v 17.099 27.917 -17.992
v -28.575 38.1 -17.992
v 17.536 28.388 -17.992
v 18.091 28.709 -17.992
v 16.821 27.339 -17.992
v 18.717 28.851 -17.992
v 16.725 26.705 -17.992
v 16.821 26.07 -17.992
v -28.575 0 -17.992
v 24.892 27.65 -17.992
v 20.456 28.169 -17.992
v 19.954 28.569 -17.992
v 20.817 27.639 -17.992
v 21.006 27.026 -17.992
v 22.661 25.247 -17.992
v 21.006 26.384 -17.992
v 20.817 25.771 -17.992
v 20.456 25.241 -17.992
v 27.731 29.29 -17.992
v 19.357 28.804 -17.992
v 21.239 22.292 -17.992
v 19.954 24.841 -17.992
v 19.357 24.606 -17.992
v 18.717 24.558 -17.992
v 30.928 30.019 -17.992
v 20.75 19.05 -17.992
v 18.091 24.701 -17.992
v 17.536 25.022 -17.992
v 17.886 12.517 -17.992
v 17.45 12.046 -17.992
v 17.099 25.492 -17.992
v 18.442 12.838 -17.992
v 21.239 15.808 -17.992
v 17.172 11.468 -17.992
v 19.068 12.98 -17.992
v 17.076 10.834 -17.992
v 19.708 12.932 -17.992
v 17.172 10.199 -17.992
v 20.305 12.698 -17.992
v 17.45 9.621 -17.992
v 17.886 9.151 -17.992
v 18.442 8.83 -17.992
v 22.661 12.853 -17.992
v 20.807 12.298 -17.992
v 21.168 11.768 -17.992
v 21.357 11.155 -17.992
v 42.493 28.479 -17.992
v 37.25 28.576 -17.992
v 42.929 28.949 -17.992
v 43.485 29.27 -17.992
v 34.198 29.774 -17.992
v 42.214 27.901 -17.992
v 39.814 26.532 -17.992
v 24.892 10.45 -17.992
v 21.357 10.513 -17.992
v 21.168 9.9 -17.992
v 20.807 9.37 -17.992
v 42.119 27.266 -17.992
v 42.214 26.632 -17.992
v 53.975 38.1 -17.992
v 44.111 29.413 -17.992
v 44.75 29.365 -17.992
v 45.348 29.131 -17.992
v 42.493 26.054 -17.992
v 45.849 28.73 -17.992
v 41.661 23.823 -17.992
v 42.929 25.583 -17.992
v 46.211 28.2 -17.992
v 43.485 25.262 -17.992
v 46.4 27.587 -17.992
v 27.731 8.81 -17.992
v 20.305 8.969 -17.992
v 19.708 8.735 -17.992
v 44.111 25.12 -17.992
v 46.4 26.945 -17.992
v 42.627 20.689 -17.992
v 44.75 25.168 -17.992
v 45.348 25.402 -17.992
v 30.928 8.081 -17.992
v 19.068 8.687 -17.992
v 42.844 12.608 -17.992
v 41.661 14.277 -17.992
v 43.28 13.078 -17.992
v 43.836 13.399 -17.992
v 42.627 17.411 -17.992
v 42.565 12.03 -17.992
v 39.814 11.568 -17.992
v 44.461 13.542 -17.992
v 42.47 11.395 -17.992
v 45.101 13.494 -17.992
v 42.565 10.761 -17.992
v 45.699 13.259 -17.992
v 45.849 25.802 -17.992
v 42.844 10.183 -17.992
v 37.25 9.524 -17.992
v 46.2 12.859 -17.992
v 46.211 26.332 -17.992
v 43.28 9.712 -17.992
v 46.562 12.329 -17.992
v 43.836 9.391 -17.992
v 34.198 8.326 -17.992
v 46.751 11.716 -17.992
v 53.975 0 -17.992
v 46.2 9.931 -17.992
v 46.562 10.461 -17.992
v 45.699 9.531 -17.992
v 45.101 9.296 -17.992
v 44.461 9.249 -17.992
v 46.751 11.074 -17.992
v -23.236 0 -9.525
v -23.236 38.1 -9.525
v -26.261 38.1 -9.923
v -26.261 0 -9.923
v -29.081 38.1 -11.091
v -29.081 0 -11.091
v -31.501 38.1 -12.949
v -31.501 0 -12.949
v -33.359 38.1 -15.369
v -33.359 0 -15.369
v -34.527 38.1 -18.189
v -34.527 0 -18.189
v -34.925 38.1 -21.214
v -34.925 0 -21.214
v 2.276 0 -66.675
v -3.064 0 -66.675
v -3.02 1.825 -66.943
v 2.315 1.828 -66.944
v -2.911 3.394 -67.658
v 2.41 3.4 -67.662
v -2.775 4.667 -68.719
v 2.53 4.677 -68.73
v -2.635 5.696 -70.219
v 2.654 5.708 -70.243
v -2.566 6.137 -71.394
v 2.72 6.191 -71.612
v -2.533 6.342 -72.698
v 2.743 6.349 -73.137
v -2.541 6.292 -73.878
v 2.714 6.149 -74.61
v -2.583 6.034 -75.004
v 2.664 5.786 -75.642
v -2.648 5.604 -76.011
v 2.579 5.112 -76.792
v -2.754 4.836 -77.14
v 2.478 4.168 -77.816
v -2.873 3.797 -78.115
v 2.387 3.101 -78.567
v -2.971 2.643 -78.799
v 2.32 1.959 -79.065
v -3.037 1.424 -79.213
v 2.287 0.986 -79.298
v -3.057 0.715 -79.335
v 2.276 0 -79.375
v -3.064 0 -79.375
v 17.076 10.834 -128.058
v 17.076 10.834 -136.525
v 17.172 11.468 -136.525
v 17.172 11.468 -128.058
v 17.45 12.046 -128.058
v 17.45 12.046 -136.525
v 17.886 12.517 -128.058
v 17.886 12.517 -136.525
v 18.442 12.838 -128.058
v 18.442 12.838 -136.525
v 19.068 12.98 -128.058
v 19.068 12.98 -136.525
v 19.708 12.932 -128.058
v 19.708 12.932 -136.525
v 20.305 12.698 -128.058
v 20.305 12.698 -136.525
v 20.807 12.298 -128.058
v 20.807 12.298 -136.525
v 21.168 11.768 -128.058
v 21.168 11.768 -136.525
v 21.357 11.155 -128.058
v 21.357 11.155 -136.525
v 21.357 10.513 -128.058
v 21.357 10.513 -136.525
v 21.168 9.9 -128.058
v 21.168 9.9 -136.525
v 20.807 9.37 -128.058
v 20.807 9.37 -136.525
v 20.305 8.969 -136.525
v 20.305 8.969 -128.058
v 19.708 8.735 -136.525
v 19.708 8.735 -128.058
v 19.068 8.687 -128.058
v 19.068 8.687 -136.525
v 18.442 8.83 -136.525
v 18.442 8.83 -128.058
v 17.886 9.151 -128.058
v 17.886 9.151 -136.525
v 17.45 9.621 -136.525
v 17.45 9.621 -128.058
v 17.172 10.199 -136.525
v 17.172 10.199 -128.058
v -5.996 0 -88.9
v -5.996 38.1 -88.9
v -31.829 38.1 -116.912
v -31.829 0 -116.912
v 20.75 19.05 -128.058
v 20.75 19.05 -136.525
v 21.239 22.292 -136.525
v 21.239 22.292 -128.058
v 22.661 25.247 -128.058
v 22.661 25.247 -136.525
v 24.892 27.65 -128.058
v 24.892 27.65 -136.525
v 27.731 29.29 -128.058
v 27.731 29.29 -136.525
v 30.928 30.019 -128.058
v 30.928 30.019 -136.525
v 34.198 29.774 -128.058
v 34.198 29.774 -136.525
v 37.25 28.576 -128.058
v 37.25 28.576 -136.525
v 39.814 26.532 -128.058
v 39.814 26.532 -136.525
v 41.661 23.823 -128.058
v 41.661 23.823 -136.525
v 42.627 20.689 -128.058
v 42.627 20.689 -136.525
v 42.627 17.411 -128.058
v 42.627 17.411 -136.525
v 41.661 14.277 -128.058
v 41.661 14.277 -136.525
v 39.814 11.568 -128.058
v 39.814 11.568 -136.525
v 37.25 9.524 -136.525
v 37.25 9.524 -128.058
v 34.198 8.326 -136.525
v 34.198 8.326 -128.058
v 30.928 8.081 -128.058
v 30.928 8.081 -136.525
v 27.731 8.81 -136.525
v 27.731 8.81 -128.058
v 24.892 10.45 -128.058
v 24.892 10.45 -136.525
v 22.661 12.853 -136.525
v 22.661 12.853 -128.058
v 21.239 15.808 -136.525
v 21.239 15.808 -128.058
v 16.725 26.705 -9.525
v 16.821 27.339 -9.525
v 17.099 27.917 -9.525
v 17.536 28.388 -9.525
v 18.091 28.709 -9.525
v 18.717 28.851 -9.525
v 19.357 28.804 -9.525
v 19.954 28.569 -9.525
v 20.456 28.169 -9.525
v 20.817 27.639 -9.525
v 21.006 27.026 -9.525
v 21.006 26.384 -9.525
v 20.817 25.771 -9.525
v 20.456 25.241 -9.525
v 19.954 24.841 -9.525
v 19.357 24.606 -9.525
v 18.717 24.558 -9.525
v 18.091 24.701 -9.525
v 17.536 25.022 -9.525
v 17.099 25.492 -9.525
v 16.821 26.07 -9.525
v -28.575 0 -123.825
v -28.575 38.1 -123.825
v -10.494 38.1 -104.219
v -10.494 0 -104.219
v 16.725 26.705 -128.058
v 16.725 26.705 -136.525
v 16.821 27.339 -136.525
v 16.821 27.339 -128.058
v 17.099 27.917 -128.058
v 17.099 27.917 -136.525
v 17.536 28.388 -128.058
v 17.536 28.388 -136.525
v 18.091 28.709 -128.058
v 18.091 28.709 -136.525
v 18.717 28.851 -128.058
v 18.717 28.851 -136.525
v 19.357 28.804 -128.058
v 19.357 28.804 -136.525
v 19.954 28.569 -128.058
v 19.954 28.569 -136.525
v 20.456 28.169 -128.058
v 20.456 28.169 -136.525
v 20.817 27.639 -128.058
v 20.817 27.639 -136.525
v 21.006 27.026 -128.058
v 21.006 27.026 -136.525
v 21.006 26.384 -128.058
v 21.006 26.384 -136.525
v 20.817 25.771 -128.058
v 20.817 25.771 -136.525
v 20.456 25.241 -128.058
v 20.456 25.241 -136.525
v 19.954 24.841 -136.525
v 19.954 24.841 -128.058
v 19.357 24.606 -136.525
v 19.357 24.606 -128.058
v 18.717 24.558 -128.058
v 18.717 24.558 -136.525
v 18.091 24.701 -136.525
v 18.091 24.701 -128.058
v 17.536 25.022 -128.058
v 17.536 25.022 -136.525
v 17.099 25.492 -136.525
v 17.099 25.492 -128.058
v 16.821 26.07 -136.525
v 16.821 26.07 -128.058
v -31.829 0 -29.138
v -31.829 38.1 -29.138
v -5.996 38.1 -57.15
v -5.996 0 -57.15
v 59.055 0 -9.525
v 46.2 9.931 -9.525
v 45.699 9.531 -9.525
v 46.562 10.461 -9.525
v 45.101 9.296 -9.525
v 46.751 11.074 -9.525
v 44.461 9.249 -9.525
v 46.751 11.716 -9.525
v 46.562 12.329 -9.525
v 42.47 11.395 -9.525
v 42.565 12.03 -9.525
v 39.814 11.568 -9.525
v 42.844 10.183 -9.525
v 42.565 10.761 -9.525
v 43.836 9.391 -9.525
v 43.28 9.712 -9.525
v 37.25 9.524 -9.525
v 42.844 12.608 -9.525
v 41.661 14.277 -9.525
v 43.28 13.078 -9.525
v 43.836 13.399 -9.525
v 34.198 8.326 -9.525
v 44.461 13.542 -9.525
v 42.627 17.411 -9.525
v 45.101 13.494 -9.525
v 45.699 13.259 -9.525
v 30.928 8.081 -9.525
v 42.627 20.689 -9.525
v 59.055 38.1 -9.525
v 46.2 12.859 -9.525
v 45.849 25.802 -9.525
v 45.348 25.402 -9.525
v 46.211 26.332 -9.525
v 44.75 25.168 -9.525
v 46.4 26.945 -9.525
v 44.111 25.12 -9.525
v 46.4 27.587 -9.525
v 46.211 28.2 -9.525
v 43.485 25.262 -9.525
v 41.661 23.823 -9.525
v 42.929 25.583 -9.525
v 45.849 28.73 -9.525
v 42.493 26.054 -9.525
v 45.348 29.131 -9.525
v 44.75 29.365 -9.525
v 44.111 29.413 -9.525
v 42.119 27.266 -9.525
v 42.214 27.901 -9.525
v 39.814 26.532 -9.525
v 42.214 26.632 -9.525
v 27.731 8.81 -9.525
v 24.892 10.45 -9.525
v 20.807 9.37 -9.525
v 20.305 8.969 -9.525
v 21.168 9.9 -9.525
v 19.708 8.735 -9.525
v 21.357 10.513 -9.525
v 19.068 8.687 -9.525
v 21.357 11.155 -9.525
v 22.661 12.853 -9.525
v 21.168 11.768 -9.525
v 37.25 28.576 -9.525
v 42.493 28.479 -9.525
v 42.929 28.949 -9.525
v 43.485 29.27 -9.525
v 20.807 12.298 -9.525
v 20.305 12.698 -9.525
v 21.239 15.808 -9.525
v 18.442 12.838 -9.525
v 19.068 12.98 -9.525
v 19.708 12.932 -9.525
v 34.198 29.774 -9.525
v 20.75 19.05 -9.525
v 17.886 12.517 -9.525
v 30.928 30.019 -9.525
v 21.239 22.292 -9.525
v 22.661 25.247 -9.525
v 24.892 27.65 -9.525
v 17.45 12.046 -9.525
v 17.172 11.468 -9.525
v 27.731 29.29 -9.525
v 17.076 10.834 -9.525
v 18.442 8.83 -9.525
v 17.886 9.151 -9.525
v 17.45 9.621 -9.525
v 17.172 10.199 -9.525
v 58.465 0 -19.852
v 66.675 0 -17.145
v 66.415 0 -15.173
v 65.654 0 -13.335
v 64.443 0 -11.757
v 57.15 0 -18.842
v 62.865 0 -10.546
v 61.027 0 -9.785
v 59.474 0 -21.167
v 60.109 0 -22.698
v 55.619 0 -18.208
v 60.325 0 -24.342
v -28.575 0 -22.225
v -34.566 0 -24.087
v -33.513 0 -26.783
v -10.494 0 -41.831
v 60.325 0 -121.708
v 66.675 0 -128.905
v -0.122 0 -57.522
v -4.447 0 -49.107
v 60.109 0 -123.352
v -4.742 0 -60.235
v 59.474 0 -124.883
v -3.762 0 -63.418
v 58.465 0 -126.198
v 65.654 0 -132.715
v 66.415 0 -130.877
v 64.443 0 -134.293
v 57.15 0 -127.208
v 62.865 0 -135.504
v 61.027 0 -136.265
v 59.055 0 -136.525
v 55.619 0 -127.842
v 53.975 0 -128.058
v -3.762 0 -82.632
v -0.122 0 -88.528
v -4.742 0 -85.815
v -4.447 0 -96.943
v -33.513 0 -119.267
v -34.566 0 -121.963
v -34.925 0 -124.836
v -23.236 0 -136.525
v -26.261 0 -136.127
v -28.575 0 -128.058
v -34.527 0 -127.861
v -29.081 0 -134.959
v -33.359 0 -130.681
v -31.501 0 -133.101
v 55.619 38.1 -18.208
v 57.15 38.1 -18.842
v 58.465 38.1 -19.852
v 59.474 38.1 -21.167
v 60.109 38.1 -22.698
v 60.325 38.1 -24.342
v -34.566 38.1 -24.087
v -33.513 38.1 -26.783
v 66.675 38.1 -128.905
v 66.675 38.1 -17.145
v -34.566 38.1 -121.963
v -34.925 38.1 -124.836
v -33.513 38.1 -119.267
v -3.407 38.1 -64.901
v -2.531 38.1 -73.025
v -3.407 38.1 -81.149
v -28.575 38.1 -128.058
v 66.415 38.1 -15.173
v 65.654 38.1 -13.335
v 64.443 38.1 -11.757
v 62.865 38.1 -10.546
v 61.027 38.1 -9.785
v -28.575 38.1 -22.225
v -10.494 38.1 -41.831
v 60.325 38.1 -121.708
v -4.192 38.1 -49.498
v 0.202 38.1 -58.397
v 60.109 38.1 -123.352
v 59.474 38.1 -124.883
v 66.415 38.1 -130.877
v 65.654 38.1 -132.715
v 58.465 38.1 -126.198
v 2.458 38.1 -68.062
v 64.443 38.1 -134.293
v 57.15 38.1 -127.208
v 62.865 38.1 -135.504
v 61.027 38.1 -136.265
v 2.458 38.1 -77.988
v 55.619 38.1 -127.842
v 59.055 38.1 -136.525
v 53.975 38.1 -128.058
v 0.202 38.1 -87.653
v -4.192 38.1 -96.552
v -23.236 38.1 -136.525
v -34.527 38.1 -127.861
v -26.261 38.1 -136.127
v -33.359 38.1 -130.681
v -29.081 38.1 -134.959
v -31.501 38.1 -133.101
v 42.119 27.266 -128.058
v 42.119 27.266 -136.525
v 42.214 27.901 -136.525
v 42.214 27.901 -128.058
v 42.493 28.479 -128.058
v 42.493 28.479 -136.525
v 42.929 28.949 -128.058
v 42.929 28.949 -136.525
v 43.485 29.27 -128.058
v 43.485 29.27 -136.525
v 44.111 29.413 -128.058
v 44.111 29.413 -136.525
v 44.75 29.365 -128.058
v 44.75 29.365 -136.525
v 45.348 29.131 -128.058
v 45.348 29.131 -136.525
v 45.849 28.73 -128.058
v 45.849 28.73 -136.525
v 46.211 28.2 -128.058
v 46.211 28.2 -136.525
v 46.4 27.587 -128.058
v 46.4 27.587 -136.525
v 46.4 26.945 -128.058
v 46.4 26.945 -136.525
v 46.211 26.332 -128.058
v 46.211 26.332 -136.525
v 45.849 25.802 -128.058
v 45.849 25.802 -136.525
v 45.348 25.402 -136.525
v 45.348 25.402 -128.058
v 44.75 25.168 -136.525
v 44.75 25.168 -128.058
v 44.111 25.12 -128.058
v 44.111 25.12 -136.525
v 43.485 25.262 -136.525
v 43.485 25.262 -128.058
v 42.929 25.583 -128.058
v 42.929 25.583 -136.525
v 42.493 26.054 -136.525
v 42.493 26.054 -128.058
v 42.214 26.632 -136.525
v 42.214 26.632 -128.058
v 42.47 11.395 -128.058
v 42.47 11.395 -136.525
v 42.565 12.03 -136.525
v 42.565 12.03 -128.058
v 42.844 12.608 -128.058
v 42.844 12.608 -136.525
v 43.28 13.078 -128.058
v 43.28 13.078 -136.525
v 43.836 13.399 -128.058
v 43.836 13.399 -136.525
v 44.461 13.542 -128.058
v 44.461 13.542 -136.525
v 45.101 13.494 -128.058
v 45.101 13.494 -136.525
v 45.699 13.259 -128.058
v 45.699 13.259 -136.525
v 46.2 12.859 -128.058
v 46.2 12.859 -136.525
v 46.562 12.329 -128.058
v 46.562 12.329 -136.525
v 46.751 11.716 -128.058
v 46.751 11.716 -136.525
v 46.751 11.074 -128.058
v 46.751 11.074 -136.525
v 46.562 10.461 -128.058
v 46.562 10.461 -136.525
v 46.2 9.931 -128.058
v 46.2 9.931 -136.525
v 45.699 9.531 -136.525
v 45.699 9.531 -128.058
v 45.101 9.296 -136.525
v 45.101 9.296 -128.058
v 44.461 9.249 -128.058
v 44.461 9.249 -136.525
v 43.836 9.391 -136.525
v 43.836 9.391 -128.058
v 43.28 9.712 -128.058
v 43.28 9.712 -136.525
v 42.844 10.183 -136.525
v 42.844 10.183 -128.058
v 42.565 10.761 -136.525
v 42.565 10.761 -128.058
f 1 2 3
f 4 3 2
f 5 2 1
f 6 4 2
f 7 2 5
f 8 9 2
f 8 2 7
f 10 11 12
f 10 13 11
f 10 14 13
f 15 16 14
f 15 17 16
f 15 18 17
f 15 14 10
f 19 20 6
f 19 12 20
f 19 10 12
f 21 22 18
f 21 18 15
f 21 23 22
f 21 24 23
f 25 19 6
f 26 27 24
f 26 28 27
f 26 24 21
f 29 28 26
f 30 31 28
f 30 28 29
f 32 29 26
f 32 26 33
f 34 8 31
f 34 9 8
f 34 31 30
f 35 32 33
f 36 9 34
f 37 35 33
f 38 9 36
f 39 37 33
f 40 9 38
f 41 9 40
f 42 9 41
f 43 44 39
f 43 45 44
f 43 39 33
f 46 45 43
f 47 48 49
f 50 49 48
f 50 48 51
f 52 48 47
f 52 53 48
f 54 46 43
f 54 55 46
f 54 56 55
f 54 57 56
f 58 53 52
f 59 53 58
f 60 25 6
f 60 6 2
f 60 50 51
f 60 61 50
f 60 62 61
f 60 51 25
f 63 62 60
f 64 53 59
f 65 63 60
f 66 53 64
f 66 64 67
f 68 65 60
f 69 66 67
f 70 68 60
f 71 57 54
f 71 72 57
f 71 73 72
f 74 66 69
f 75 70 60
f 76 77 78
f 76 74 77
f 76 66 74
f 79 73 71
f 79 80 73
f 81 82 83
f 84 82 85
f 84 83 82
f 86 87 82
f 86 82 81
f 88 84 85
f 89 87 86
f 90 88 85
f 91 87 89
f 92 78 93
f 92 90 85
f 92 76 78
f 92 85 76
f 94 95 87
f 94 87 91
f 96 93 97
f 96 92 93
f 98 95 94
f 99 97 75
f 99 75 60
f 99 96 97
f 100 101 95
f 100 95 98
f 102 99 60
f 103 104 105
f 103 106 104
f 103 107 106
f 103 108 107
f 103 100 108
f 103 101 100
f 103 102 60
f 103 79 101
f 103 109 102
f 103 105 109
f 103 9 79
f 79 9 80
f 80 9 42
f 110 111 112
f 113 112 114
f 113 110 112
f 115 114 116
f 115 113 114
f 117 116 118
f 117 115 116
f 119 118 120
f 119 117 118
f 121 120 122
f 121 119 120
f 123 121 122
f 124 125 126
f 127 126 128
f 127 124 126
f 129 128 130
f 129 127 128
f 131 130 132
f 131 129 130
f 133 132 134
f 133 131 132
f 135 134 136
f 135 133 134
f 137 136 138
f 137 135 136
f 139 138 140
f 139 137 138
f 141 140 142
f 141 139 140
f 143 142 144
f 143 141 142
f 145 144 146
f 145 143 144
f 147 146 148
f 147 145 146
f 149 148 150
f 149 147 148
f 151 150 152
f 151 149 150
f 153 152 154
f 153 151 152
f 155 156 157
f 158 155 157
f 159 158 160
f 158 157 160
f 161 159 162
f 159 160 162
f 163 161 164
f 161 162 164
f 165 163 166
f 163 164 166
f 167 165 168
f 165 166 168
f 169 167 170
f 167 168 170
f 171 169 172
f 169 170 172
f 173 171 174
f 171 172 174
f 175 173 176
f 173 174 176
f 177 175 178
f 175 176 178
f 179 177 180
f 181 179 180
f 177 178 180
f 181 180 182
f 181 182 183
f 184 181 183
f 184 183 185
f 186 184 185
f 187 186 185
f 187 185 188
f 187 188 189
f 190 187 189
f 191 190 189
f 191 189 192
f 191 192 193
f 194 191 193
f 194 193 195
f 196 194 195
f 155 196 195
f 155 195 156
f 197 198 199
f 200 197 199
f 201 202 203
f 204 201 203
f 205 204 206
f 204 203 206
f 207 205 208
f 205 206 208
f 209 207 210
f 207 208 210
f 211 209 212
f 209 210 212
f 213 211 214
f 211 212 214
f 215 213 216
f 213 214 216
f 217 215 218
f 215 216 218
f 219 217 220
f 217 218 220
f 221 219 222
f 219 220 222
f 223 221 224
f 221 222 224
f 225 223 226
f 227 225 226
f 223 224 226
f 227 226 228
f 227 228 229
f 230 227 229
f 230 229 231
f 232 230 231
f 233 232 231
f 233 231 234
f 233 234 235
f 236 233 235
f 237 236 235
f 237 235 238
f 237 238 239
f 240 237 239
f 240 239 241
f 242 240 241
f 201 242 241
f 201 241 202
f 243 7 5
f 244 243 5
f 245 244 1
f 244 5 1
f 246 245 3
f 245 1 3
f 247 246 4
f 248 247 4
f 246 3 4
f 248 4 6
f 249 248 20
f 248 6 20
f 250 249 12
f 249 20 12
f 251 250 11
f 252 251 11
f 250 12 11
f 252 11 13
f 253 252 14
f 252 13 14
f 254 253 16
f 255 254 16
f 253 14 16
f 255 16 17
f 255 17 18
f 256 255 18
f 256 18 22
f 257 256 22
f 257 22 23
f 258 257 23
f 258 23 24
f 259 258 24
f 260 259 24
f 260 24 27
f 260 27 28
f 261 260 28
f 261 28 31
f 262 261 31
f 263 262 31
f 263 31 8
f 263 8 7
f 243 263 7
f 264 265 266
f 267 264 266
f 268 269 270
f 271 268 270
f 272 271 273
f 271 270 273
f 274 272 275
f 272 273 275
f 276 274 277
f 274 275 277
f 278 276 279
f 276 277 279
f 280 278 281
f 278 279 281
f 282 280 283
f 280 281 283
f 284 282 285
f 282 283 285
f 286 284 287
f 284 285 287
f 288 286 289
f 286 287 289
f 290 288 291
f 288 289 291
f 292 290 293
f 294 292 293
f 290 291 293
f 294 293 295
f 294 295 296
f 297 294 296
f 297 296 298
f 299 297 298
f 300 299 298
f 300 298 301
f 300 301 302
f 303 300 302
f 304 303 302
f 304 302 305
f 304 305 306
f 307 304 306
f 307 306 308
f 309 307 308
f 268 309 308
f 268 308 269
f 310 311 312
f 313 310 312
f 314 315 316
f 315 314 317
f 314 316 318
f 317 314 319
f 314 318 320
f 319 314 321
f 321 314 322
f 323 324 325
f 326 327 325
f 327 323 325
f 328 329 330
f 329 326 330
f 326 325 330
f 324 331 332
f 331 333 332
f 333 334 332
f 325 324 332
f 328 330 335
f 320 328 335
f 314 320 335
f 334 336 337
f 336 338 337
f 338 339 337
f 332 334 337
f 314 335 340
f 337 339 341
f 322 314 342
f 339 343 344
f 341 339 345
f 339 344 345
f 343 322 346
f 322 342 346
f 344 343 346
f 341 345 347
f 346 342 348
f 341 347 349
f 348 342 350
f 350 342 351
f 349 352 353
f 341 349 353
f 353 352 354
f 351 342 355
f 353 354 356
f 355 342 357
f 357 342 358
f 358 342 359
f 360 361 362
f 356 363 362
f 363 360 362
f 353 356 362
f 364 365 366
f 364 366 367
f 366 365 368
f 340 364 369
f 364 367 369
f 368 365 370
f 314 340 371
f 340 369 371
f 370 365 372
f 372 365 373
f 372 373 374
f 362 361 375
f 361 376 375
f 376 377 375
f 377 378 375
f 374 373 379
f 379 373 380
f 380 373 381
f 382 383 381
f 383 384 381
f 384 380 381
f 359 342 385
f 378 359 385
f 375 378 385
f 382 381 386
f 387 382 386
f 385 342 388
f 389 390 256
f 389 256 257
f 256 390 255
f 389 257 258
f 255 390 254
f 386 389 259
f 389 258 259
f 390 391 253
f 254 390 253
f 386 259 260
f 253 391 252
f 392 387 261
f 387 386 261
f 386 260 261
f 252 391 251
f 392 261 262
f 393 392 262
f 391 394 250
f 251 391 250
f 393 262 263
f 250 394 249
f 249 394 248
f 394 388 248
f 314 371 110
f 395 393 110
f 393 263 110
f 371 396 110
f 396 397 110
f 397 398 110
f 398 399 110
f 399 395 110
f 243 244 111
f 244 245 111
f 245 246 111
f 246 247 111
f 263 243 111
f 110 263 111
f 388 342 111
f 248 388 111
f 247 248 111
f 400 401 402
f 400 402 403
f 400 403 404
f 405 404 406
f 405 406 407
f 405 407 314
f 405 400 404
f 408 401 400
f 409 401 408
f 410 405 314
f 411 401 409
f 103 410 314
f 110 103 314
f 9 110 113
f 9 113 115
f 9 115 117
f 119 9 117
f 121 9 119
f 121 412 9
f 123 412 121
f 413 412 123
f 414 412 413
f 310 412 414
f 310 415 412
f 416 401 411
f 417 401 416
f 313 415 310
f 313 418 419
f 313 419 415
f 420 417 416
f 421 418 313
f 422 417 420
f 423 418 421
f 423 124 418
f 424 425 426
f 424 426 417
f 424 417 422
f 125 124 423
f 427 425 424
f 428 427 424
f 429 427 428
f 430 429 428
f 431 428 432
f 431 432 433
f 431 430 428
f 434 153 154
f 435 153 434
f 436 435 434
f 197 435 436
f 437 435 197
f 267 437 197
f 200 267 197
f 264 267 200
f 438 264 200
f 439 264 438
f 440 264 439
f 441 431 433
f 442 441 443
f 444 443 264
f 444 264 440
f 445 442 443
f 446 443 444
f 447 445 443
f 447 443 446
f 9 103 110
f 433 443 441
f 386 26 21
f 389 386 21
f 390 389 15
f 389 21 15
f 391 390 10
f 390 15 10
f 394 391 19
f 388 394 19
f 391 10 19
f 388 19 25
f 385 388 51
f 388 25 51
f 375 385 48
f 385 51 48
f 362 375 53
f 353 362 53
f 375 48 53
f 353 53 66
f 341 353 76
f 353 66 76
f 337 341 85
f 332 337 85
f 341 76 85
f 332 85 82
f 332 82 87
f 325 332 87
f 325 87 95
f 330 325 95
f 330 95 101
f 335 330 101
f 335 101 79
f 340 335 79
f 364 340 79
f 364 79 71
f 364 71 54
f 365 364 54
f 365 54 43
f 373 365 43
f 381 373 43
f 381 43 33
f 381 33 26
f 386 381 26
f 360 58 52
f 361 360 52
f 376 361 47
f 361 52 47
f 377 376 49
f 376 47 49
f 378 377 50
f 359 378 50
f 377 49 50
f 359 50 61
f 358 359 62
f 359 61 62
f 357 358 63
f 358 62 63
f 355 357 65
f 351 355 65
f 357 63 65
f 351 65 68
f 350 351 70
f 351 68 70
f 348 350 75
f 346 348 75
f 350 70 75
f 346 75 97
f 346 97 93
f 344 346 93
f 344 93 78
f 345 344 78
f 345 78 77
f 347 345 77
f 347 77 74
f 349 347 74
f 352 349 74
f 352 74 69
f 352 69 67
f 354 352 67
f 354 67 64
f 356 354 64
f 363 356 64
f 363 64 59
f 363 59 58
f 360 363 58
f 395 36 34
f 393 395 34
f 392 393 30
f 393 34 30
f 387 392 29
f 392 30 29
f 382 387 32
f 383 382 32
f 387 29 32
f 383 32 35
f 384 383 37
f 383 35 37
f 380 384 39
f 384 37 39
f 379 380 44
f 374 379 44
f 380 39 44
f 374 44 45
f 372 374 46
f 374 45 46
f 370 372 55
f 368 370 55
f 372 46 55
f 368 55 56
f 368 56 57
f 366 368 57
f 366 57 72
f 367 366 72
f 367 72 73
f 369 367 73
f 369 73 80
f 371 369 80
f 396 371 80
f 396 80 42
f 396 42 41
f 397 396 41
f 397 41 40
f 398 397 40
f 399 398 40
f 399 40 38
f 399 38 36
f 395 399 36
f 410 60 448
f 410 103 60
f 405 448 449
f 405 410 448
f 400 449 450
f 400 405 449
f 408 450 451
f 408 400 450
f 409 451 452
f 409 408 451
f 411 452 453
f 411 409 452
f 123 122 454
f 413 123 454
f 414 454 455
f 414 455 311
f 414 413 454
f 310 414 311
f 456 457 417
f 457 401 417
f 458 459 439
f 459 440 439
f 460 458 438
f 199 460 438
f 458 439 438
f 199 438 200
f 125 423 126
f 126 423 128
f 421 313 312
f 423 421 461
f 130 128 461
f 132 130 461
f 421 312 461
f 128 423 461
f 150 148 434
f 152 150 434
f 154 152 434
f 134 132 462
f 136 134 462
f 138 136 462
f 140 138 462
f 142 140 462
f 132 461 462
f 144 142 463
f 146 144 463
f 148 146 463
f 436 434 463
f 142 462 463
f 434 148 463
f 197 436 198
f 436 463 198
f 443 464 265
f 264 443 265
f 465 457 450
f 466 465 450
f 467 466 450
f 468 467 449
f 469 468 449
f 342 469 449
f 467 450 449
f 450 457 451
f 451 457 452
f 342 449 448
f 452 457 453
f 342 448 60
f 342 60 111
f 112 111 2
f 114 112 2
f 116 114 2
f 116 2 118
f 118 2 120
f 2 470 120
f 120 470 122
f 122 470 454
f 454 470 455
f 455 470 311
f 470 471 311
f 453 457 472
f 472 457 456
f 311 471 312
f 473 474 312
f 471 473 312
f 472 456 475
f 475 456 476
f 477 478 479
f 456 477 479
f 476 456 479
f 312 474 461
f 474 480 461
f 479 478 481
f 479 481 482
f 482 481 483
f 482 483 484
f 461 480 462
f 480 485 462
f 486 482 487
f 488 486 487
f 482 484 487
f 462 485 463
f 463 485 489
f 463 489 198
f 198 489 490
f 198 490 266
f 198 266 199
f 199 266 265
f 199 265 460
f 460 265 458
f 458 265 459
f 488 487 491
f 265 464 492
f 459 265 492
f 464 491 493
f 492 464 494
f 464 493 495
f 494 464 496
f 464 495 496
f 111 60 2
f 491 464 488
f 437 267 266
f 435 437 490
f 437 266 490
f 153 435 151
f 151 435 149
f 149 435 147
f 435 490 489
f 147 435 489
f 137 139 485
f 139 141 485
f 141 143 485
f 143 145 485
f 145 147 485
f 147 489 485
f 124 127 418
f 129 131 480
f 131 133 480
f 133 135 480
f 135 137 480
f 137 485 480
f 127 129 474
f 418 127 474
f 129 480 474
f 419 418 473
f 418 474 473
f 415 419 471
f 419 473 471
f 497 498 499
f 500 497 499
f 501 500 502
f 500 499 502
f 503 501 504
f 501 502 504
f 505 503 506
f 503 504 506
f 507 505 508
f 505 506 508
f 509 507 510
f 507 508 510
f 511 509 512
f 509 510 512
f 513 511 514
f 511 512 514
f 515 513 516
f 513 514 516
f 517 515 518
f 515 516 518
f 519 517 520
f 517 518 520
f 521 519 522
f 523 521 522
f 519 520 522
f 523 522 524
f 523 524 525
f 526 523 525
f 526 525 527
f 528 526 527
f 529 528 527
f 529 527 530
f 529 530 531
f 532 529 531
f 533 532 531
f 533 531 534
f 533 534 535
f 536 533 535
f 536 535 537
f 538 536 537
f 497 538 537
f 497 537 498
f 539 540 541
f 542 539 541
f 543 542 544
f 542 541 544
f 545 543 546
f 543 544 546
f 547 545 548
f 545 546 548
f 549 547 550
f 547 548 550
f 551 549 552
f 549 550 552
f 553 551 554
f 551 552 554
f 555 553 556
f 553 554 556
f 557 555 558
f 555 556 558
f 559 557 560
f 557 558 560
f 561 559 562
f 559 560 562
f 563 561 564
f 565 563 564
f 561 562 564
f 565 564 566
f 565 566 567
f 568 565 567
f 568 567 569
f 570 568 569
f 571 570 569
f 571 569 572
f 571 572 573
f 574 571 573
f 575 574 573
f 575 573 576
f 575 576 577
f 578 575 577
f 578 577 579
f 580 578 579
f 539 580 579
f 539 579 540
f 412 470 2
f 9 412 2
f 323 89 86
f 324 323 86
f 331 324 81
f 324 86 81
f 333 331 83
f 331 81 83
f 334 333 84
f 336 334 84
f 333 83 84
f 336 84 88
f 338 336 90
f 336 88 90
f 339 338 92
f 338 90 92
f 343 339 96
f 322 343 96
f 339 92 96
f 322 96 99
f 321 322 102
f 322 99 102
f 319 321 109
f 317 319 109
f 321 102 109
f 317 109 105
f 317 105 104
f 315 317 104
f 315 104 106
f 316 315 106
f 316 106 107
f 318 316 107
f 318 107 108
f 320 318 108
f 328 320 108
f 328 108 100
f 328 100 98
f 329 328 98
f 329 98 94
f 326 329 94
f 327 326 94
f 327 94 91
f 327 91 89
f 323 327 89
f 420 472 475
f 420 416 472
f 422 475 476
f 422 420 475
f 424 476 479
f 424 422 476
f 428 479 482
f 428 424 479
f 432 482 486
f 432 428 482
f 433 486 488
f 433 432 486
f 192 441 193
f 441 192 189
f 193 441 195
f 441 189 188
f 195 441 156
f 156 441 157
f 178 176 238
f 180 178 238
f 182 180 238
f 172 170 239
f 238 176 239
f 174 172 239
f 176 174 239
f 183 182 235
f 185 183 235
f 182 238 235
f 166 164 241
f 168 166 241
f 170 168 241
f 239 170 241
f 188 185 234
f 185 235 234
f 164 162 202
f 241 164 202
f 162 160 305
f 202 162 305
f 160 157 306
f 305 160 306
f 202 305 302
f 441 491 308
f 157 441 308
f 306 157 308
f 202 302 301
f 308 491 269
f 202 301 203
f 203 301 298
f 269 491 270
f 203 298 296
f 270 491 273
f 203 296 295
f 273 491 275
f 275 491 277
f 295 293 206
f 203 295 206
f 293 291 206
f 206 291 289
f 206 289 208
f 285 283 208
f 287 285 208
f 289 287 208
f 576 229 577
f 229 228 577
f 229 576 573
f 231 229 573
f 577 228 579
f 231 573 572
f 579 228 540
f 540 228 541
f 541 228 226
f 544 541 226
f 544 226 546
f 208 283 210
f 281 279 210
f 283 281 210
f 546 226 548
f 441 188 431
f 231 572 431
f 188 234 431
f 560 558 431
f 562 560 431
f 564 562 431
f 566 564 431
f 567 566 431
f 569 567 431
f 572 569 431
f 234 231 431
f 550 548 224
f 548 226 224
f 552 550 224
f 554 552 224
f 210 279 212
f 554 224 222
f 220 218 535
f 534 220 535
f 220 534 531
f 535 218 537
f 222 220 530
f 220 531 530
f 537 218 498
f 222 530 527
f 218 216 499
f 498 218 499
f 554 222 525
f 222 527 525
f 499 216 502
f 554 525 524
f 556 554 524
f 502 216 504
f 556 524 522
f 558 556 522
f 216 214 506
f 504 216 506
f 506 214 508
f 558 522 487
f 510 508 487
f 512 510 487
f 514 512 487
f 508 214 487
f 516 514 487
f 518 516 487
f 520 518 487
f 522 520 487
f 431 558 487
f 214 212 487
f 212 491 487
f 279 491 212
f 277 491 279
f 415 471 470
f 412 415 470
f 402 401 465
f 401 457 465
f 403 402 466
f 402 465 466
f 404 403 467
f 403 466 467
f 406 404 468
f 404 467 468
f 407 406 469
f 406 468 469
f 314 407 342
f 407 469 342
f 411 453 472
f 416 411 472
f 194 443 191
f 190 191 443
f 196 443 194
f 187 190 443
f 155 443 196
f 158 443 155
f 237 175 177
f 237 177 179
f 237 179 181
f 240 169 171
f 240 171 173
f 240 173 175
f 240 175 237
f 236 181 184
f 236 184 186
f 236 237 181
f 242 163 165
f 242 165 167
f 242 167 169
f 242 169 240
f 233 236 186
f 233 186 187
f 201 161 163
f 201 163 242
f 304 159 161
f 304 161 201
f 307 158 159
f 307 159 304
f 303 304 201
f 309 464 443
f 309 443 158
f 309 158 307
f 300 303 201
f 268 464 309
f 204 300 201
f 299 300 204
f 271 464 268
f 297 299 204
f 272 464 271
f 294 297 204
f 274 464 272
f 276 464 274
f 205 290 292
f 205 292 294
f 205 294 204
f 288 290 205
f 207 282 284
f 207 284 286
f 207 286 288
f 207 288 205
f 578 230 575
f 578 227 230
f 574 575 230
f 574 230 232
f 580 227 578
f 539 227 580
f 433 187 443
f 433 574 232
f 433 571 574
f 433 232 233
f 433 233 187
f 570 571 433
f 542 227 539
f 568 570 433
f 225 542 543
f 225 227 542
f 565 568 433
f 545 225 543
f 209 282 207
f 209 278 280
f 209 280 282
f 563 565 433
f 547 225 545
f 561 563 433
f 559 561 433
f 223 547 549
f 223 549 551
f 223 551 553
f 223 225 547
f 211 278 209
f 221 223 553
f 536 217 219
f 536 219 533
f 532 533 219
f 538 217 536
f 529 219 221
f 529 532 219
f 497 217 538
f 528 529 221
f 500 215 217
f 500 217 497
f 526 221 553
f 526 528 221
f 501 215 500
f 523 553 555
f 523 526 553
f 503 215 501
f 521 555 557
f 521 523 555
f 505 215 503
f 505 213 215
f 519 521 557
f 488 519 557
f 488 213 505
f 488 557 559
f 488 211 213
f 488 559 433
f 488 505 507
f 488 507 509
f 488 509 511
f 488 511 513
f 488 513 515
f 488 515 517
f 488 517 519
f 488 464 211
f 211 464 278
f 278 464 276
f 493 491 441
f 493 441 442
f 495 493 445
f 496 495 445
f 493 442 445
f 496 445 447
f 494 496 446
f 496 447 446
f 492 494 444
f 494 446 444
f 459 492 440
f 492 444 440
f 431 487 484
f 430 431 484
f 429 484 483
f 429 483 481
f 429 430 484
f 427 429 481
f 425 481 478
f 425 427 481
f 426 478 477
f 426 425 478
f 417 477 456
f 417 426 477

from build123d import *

# Parameters (mm, degrees)
SKETCH1_W               = 95.25
SKETCH1_H               = 8.466666667
BOSS_EXTRUDE1_DEPTH     = 38.1
SKETCH2_W               = 6.35
SKETCH2_H               = 127
BOSS_EXTRUDE2_DEPTH     = 38.1
SKETCH3_W               = 88.9
SKETCH3_H               = 8.466666667
BOSS_EXTRUDE3_DEPTH     = 38.1
SKETCH4_R               = 11
CUT_EXTRUDE1_DEPTH      = 149.412147835
SKETCH5_R               = 2.15265
CUT_EXTRUDE2_DEPTH      = 149.412147835
FILLET1_R               = 7.62
BOSS_EXTRUDE4_DEPTH     = 38.1
CUT_EXTRUDE8_REACH      = 172.773
CUT_EXTRUDE8_END_RADIUS = 38.1
FILLET2_R               = 11.688947
FILLET3_R               = 11.688947
FILLET4_R               = 6.35


with BuildPart() as part:
    # Sketch1 → Boss-Extrude1 (new body)
    with BuildSketch(Plane(origin=(0, 0, 0), x_dir=(1, 0, 0), z_dir=(0, 1, 0))):
        with Locations((19.05, 13.758333334)):
            Rectangle(SKETCH1_W, SKETCH1_H)
    extrude(amount=BOSS_EXTRUDE1_DEPTH)

    # Sketch2 → Boss-Extrude2 (add)
    with BuildSketch(Plane(origin=(0, 38.1, 0), x_dir=(1, 0, 0), z_dir=(0, 1, 0))):
        with Locations((63.5, 73.025)):
            Rectangle(SKETCH2_W, SKETCH2_H)
    extrude(amount=-BOSS_EXTRUDE2_DEPTH)

    # Sketch3 → Boss-Extrude3 (add)
    with BuildSketch(Plane(origin=(0, 38.1, 0), x_dir=(1, 0, 0), z_dir=(0, 1, 0))):
        with Locations((15.875, 132.291666667)):
            Rectangle(SKETCH3_W, SKETCH3_H)
    extrude(amount=-BOSS_EXTRUDE3_DEPTH)

    # Sketch4 → Cut-Extrude1 (cut, through all)
    with BuildSketch(Plane(origin=(0, 0, -136.525), x_dir=(-1, 0, 0), z_dir=(0, 0, -1))):
        with Locations((-31.75, 19.05)):
            Circle(SKETCH4_R)
    extrude(amount=-CUT_EXTRUDE1_DEPTH, mode=Mode.SUBTRACT)

    # Sketch5 → Cut-Extrude2 (cut, through all)
    with BuildSketch(Plane(origin=(0, 0, -136.525), x_dir=(-1, 0, 0), z_dir=(0, 0, -1))):
        with Locations((-18.877667779, 26.704865736)):
            Circle(SKETCH5_R)
        with Locations((-19.228536904, 10.833743663)):
            Circle(SKETCH5_R)
        with Locations((-44.622332221, 11.395134264)):
            Circle(SKETCH5_R)
        with Locations((-44.271463096, 27.266256337)):
            Circle(SKETCH5_R)
    extrude(amount=-CUT_EXTRUDE2_DEPTH, mode=Mode.SUBTRACT)

    # Fillet1
    fillet1_edges = [part.edges().sort_by_distance(p)[0] for p in [
        (66.675, 19.05, -136.525),
        (66.675, 19.05, -9.525),
    ]]
    fillet(fillet1_edges, radius=FILLET1_R)

    # Sketch10 → Boss-Extrude4 (add)
    with BuildSketch(Plane(origin=(0, 38.1, 0), x_dir=(1, 0, 0), z_dir=(0, 1, 0))):
        with BuildLine():
            Line((-28.575, 17.991666667), (-28.575, 9.525))
            Line((-28.575, 9.525), (-34.925, 9.525))
            Line((-34.925, 9.525), (-34.925, 25.781))
            Line((-34.925, 25.781), (-5.996027965, 57.15))
            ThreePointArc((-5.996027965, 57.15), (-2.531188929, 73.025), (-5.996027965, 88.9))
            Line((-5.996027965, 88.9), (-34.925, 120.269))
            Line((-34.925, 120.269), (-34.925, 136.525))
            Line((-34.925, 136.525), (-28.575, 136.525))
            Line((-28.575, 136.525), (-28.575, 123.825))
            Line((-28.575, 123.825), (-10.494392478, 104.219375))
            ThreePointArc((-10.494392478, 104.219375), (2.742945437, 73.025), (-10.494392478, 41.830625))
            Line((-10.494392478, 41.830625), (-28.575, 22.225))
            Line((-28.575, 22.225), (-28.575, 17.991666667))
        make_face()
    extrude(amount=-BOSS_EXTRUDE4_DEPTH)

    # Cut-Extrude8: up to this cylinder (the profile starts outside it)
    cut_extrude8_end = Plane(origin=(-40.631188929, 2.695024, -73.025), z_dir=(0, 1, 0)) * Cylinder(CUT_EXTRUDE8_END_RADIUS, 422.746, mode=Mode.PRIVATE)
    # Sketch12 → Cut-Extrude8 (cut, up to the surface)
    with BuildSketch(Plane.ZY.offset(-60.325), mode=Mode.PRIVATE) as cut_extrude8_sk1:
        with BuildLine():
            Line((-79.375, 0), (-66.675, 0))
            ThreePointArc((-66.675, 0), (-73.025, 6.35), (-79.375, 0))
        make_face()
    cut_extrude8_tool1 = extrude(cut_extrude8_sk1.sketch, amount=CUT_EXTRUDE8_REACH, mode=Mode.PRIVATE) - cut_extrude8_end
    add(cut_extrude8_tool1.solids().sort_by_distance((60.325, 2.695024, -73.025))[0], mode=Mode.SUBTRACT)

    # Fillet2
    fillet2_edges = [part.edges().sort_by_distance(p)[0] for p in [
        (-34.925, 19.05, -136.525),
        (-34.925, 19.05, -120.269),
    ]]
    fillet(fillet2_edges, radius=FILLET2_R - 0.0001)  # a hair under: the kernel refuses the full size

    # Fillet3
    fillet3_edges = [part.edges().sort_by_distance(p)[0] for p in [
        (-34.925, 19.05, -25.781),
        (-34.925, 19.05, -9.525),
    ]]
    fillet(fillet3_edges, radius=FILLET3_R - 0.0001)  # a hair under: the kernel refuses the full size

    # Fillet4
    fillet4_edges = [part.edges().sort_by_distance(p)[0] for p in [
        (60.325, 19.05, -17.991666667),
        (60.325, 19.05, -128.058333333),
    ]]
    fillet(fillet4_edges, radius=FILLET4_R)


solid = part.part
